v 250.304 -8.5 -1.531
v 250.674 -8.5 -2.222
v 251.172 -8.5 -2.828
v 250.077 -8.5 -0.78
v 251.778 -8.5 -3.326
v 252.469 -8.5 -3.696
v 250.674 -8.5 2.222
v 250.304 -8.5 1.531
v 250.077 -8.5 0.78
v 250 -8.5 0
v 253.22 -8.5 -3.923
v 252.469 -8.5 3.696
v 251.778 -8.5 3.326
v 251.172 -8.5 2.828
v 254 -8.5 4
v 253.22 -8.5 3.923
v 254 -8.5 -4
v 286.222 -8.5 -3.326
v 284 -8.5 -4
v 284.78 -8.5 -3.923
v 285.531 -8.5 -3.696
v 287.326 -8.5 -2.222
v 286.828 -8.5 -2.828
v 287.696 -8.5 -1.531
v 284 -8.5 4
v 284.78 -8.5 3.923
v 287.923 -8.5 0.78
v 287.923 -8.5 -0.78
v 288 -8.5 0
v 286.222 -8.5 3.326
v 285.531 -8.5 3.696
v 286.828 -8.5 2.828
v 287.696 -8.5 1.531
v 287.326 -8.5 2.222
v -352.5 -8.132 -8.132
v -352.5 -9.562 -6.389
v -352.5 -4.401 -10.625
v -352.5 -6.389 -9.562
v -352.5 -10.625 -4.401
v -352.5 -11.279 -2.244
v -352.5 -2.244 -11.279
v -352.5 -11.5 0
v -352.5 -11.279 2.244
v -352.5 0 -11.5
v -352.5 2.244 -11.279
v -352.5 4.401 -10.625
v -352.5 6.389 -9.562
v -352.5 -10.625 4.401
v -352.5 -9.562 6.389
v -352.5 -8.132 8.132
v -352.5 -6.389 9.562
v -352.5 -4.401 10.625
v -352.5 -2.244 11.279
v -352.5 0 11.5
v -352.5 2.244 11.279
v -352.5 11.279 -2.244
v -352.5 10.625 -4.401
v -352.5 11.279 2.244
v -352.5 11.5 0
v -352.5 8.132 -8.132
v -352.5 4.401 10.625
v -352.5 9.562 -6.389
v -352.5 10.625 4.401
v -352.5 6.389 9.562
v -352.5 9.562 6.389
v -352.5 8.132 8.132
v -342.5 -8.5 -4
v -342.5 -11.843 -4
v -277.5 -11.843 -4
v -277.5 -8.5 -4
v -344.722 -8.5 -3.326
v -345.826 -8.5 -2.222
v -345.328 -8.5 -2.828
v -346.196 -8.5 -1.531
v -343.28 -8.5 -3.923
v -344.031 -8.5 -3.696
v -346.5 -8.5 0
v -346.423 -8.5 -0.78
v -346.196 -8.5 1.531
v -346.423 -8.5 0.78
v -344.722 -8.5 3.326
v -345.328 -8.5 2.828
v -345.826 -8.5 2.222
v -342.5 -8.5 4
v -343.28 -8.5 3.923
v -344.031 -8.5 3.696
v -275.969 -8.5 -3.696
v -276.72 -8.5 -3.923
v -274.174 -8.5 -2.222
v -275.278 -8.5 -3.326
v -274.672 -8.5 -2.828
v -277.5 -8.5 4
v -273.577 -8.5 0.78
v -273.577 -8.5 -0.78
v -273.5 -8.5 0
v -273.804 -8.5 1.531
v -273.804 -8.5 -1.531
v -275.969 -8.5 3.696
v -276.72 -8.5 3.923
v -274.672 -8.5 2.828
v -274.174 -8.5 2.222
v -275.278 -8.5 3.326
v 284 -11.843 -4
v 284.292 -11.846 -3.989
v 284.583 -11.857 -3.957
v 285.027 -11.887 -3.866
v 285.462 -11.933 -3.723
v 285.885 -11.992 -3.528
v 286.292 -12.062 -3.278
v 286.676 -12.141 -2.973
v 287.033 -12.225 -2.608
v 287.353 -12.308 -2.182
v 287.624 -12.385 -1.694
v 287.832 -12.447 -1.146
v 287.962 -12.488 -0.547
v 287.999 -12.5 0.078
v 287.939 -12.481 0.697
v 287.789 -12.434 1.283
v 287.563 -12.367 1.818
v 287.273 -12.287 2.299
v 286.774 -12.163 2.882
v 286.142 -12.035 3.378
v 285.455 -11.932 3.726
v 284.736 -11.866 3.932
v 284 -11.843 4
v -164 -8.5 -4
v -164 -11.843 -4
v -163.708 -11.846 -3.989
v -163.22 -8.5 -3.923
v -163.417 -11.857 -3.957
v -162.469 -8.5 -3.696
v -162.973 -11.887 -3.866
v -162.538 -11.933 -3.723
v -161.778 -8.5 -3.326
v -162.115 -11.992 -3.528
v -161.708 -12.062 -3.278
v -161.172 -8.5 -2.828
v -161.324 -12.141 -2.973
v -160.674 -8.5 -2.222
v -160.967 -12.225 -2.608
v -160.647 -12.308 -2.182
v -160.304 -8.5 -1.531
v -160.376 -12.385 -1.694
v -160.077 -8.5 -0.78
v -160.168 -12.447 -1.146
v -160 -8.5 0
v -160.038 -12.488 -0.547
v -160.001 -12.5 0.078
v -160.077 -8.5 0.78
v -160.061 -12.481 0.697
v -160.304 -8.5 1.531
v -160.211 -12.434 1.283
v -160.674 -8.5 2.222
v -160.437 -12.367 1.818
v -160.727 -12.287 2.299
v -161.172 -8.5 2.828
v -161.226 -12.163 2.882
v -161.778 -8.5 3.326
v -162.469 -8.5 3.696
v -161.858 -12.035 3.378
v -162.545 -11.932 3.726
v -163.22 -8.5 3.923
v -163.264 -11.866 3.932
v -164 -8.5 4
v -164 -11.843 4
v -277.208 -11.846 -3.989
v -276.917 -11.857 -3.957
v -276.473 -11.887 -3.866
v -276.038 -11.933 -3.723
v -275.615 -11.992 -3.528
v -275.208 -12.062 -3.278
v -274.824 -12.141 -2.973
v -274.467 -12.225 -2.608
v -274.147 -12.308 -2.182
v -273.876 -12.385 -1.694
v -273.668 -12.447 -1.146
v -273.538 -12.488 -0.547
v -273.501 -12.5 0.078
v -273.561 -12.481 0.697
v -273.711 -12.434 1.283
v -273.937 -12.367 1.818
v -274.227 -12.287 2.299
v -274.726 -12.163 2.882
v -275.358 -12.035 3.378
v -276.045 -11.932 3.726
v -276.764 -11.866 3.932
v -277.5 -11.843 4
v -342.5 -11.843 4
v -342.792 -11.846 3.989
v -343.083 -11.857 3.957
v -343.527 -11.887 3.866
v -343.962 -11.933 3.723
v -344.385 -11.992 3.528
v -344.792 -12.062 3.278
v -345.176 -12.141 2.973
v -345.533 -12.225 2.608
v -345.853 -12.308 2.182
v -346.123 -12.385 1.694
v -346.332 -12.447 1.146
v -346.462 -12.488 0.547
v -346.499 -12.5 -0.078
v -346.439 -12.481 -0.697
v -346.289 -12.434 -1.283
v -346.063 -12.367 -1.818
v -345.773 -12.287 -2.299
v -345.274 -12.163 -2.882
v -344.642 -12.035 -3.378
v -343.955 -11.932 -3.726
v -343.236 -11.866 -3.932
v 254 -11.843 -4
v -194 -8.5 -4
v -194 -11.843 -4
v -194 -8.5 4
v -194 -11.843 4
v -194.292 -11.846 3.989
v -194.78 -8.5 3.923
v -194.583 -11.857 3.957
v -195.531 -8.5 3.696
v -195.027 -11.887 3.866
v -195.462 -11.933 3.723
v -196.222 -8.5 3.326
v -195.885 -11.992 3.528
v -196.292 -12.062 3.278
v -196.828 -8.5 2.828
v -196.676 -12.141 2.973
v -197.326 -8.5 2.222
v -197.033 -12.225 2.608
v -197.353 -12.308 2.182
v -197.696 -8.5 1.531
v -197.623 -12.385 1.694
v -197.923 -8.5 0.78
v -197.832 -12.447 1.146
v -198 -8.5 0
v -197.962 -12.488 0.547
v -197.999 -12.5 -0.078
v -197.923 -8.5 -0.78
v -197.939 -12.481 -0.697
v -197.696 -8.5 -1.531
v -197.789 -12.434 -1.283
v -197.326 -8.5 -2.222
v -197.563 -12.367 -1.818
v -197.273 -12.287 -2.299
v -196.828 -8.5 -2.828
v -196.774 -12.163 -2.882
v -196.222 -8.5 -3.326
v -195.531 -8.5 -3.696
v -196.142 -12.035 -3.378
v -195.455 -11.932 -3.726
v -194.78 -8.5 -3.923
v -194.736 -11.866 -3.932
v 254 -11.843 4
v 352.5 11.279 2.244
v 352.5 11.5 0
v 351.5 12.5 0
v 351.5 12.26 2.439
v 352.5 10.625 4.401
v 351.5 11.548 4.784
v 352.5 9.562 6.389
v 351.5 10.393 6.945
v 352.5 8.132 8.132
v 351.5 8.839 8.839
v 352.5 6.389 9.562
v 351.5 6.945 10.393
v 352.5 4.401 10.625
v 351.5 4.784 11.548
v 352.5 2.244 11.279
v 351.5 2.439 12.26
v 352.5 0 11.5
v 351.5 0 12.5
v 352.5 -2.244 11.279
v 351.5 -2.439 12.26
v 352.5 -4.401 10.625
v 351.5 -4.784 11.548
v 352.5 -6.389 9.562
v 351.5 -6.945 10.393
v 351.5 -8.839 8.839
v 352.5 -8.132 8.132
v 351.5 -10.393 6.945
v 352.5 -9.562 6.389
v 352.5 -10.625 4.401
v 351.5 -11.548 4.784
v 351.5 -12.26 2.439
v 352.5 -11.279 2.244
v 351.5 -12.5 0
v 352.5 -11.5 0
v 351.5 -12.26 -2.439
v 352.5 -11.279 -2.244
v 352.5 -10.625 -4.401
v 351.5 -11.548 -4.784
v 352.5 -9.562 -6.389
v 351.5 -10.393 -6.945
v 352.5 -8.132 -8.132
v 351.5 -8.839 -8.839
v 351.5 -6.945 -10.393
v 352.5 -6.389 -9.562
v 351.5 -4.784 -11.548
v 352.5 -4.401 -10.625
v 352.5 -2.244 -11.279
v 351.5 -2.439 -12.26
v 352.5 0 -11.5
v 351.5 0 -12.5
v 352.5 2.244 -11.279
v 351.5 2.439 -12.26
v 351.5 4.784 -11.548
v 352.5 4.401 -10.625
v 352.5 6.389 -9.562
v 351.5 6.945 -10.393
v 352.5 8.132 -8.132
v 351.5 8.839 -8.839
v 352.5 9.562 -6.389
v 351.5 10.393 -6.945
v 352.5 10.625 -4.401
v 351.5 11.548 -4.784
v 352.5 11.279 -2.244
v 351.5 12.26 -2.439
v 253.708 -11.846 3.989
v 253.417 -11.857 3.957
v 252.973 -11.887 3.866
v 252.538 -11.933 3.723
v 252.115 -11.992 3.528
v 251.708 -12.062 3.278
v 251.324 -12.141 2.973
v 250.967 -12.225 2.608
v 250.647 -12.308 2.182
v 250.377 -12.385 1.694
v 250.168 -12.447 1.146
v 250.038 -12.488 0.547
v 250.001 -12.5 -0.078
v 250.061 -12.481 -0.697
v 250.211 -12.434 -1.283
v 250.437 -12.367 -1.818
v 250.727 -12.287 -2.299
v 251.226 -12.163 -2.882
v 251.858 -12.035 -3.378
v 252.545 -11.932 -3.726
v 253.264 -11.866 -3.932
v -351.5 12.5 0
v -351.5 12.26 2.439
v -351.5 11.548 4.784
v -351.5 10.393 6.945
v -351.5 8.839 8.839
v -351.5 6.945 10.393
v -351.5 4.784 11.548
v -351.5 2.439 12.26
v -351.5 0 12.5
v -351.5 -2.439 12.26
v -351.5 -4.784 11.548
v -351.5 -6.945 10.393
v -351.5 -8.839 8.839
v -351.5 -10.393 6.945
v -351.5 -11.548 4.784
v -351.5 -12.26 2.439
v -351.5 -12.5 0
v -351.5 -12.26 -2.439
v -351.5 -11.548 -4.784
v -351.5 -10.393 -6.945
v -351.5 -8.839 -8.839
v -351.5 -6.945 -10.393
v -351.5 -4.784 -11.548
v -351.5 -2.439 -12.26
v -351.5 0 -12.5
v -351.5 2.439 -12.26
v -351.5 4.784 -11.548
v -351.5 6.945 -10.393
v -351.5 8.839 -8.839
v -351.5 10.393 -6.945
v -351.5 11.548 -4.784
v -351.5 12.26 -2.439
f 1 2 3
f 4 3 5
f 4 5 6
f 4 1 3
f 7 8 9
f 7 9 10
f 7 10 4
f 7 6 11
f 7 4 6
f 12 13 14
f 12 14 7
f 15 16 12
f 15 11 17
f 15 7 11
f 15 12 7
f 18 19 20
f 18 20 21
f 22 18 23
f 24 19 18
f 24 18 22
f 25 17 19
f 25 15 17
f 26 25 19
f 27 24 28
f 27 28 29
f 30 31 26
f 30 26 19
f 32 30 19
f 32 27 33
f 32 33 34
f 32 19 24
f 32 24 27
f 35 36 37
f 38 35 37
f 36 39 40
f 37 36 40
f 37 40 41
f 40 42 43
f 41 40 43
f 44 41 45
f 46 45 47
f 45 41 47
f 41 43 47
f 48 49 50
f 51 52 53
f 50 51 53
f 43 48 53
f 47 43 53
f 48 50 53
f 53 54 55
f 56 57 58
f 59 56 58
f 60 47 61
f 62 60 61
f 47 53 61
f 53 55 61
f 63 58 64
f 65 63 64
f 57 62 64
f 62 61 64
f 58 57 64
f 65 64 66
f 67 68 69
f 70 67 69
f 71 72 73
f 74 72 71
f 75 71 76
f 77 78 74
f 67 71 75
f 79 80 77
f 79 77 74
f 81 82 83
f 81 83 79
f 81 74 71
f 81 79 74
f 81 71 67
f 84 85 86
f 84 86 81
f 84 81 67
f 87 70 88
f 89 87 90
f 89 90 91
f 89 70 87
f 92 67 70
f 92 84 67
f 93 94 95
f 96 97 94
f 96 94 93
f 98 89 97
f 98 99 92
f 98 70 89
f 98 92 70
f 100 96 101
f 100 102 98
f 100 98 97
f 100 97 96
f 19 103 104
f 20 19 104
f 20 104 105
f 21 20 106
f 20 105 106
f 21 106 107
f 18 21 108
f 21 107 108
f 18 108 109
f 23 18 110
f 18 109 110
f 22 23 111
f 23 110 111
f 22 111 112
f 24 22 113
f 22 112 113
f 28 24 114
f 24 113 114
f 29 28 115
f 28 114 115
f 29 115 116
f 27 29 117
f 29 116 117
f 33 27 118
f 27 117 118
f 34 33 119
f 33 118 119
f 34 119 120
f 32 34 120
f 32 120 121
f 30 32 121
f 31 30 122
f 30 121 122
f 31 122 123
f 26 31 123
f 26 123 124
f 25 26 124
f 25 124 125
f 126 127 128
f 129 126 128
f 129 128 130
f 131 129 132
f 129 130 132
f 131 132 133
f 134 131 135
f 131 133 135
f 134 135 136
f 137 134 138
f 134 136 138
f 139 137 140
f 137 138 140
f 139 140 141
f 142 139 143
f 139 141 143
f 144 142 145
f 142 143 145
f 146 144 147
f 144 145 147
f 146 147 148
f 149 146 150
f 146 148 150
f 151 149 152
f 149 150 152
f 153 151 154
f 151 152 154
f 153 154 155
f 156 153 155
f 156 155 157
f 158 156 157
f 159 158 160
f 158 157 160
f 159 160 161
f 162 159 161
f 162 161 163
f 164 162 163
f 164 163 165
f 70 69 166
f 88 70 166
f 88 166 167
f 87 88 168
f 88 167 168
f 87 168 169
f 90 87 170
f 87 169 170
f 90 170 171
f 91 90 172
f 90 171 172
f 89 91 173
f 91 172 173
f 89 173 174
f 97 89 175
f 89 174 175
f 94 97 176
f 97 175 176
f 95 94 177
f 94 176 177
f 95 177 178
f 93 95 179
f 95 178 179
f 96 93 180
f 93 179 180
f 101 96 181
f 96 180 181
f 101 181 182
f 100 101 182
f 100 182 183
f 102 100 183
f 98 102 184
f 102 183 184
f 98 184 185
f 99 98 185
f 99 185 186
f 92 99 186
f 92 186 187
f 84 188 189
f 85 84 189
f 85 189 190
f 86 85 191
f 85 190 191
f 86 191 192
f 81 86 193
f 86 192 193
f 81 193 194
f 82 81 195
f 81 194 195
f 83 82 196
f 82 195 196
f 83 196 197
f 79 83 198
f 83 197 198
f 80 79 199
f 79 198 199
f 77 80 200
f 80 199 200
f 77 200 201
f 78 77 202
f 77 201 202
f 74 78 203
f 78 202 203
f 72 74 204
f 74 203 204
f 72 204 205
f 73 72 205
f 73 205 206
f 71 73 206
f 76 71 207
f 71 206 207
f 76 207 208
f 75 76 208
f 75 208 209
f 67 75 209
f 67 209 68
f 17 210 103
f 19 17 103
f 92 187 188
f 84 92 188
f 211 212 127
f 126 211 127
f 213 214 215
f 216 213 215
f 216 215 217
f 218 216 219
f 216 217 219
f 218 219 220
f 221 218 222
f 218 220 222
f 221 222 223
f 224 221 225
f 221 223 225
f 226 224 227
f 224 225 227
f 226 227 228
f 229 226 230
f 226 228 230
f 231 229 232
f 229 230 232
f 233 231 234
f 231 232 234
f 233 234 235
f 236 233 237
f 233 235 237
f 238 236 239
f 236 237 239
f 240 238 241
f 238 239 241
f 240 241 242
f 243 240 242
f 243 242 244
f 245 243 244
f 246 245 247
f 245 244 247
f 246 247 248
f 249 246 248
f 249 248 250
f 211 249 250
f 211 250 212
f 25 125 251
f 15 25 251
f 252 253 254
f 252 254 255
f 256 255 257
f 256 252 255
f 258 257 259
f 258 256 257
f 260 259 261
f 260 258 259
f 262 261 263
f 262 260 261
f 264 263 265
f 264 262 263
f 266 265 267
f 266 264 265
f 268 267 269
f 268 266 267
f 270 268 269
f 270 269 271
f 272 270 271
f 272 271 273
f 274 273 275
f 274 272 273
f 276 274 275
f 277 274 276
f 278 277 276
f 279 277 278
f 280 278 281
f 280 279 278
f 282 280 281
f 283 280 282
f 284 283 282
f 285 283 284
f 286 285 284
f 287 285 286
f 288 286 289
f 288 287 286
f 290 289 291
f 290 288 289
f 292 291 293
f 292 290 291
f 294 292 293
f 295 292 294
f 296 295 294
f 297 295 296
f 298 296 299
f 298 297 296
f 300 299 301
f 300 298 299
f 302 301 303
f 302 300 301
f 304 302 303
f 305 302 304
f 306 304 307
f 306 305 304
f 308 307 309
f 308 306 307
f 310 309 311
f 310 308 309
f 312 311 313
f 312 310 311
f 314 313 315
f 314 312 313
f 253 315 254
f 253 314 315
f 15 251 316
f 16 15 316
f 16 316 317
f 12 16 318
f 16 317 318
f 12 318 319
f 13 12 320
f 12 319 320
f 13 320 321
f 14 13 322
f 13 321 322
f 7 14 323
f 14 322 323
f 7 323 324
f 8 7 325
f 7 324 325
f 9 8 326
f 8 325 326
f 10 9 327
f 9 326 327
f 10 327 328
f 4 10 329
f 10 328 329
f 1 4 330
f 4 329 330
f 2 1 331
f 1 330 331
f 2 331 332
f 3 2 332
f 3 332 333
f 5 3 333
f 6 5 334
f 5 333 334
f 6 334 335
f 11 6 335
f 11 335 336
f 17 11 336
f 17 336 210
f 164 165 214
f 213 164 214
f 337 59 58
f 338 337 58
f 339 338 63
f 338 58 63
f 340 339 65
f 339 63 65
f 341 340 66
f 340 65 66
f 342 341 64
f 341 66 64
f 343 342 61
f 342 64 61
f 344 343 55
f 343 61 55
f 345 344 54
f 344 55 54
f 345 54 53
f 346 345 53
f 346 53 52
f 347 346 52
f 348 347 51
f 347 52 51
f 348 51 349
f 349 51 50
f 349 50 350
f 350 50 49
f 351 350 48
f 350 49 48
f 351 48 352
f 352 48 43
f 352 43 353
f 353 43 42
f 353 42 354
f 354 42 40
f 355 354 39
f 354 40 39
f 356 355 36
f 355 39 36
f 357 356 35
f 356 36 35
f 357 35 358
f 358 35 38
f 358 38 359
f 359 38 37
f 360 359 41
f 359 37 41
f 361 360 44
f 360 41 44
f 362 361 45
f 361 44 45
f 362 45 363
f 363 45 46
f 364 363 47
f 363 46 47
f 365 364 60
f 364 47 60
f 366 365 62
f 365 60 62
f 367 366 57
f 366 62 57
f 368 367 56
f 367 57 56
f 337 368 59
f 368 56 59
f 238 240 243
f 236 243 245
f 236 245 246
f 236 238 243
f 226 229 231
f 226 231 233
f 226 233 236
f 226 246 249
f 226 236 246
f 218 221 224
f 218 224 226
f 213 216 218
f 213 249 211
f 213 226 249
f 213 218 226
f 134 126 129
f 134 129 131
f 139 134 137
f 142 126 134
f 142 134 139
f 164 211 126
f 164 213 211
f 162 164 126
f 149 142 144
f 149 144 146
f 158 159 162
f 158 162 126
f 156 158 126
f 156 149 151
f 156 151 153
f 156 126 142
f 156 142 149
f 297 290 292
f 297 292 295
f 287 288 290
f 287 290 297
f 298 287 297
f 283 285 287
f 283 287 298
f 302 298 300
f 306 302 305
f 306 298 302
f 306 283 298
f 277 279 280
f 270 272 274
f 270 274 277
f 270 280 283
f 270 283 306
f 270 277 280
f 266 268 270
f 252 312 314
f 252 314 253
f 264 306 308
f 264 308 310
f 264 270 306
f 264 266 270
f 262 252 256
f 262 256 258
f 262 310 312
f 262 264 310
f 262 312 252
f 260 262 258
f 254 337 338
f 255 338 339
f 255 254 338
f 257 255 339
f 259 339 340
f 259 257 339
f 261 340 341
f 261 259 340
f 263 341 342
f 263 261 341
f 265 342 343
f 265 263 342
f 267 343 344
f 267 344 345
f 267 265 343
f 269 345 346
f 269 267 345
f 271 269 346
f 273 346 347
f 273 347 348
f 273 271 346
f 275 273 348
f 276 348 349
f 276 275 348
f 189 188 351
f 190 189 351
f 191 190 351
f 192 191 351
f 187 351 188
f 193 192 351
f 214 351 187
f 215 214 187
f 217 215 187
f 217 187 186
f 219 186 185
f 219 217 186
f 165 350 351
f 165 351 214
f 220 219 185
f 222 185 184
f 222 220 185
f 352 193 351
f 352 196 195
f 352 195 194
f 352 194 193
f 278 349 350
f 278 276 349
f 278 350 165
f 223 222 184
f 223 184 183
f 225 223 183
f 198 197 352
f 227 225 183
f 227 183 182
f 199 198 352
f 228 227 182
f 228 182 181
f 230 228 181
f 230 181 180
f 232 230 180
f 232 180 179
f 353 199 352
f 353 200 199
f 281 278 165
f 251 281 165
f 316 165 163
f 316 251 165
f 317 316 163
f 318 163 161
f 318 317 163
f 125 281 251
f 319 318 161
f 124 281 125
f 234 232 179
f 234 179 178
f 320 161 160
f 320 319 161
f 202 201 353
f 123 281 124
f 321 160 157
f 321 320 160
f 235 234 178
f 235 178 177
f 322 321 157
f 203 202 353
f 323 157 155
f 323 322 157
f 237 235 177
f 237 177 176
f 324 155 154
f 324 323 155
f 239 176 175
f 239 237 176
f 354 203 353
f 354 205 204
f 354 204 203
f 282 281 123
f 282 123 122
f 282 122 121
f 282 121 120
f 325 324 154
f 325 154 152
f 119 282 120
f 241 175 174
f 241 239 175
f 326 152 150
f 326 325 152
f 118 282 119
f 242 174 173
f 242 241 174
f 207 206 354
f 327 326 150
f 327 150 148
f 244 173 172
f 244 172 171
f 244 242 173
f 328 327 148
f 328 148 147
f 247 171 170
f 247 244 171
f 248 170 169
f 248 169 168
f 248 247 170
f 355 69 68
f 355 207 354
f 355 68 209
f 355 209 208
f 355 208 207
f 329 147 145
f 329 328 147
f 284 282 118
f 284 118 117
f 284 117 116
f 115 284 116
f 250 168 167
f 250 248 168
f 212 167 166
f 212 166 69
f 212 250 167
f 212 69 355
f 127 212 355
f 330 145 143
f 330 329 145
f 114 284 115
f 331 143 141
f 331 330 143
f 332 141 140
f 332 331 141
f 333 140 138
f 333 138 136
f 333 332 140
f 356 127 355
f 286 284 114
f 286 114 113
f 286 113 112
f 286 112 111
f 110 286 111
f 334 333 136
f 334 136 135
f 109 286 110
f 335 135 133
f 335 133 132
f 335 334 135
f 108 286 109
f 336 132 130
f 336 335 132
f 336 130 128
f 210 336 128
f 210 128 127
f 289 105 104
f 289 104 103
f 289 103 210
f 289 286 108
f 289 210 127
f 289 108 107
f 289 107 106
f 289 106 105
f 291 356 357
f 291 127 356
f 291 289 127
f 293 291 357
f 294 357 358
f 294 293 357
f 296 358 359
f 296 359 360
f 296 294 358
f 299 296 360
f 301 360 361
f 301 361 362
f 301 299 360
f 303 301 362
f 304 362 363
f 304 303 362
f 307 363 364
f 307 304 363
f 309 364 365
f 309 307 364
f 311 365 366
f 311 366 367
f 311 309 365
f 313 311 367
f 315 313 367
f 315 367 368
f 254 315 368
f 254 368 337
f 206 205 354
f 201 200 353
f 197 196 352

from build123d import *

# Parameters (mm, degrees)
F0_R     = 12.5
F1_DEPTH = 352.5
F4_DEPTH = 4
F5_SIZE  = 1


with BuildPart() as f1:
    # F0 (on Right) → F1 (new body, symmetric)
    with BuildSketch(Plane.YZ):
        Circle(F0_R)
    extrude(amount=F1_DEPTH, both=True)

    # F3 (on offset) → F4 (cut)
    with BuildSketch(Plane.XZ.offset(12.5)):
        with BuildLine():
            ThreePointArc((-342.5, 4), (-346.5, 0), (-342.5, -4))
            Line((-342.5, -4), (-277.5, -4))
            ThreePointArc((-277.5, -4), (-273.5, 0), (-277.5, 4))
            Line((-277.5, 4), (-342.5, 4))
        make_face()
        with BuildLine():
            ThreePointArc((-194, 4), (-198, 0), (-194, -4))
            Line((-194, -4), (-164, -4))
            ThreePointArc((-164, -4), (-160, 0), (-164, 4))
            Line((-164, 4), (-194, 4))
        make_face()
        with BuildLine():
            ThreePointArc((254, 4), (250, 0), (254, -4))
            Line((254, -4), (284, -4))
            ThreePointArc((284, -4), (288, 0), (284, 4))
            Line((284, 4), (254, 4))
        make_face()
    extrude(amount=-F4_DEPTH, mode=Mode.SUBTRACT)

    # F5
    f5_edges = [f1.edges().sort_by_distance(p)[0] for p in [
        (352.5, -12.5, 0),
        (-352.5, -12.5, 0),
    ]]
    chamfer(f5_edges, length=F5_SIZE)


solid = f1.part
